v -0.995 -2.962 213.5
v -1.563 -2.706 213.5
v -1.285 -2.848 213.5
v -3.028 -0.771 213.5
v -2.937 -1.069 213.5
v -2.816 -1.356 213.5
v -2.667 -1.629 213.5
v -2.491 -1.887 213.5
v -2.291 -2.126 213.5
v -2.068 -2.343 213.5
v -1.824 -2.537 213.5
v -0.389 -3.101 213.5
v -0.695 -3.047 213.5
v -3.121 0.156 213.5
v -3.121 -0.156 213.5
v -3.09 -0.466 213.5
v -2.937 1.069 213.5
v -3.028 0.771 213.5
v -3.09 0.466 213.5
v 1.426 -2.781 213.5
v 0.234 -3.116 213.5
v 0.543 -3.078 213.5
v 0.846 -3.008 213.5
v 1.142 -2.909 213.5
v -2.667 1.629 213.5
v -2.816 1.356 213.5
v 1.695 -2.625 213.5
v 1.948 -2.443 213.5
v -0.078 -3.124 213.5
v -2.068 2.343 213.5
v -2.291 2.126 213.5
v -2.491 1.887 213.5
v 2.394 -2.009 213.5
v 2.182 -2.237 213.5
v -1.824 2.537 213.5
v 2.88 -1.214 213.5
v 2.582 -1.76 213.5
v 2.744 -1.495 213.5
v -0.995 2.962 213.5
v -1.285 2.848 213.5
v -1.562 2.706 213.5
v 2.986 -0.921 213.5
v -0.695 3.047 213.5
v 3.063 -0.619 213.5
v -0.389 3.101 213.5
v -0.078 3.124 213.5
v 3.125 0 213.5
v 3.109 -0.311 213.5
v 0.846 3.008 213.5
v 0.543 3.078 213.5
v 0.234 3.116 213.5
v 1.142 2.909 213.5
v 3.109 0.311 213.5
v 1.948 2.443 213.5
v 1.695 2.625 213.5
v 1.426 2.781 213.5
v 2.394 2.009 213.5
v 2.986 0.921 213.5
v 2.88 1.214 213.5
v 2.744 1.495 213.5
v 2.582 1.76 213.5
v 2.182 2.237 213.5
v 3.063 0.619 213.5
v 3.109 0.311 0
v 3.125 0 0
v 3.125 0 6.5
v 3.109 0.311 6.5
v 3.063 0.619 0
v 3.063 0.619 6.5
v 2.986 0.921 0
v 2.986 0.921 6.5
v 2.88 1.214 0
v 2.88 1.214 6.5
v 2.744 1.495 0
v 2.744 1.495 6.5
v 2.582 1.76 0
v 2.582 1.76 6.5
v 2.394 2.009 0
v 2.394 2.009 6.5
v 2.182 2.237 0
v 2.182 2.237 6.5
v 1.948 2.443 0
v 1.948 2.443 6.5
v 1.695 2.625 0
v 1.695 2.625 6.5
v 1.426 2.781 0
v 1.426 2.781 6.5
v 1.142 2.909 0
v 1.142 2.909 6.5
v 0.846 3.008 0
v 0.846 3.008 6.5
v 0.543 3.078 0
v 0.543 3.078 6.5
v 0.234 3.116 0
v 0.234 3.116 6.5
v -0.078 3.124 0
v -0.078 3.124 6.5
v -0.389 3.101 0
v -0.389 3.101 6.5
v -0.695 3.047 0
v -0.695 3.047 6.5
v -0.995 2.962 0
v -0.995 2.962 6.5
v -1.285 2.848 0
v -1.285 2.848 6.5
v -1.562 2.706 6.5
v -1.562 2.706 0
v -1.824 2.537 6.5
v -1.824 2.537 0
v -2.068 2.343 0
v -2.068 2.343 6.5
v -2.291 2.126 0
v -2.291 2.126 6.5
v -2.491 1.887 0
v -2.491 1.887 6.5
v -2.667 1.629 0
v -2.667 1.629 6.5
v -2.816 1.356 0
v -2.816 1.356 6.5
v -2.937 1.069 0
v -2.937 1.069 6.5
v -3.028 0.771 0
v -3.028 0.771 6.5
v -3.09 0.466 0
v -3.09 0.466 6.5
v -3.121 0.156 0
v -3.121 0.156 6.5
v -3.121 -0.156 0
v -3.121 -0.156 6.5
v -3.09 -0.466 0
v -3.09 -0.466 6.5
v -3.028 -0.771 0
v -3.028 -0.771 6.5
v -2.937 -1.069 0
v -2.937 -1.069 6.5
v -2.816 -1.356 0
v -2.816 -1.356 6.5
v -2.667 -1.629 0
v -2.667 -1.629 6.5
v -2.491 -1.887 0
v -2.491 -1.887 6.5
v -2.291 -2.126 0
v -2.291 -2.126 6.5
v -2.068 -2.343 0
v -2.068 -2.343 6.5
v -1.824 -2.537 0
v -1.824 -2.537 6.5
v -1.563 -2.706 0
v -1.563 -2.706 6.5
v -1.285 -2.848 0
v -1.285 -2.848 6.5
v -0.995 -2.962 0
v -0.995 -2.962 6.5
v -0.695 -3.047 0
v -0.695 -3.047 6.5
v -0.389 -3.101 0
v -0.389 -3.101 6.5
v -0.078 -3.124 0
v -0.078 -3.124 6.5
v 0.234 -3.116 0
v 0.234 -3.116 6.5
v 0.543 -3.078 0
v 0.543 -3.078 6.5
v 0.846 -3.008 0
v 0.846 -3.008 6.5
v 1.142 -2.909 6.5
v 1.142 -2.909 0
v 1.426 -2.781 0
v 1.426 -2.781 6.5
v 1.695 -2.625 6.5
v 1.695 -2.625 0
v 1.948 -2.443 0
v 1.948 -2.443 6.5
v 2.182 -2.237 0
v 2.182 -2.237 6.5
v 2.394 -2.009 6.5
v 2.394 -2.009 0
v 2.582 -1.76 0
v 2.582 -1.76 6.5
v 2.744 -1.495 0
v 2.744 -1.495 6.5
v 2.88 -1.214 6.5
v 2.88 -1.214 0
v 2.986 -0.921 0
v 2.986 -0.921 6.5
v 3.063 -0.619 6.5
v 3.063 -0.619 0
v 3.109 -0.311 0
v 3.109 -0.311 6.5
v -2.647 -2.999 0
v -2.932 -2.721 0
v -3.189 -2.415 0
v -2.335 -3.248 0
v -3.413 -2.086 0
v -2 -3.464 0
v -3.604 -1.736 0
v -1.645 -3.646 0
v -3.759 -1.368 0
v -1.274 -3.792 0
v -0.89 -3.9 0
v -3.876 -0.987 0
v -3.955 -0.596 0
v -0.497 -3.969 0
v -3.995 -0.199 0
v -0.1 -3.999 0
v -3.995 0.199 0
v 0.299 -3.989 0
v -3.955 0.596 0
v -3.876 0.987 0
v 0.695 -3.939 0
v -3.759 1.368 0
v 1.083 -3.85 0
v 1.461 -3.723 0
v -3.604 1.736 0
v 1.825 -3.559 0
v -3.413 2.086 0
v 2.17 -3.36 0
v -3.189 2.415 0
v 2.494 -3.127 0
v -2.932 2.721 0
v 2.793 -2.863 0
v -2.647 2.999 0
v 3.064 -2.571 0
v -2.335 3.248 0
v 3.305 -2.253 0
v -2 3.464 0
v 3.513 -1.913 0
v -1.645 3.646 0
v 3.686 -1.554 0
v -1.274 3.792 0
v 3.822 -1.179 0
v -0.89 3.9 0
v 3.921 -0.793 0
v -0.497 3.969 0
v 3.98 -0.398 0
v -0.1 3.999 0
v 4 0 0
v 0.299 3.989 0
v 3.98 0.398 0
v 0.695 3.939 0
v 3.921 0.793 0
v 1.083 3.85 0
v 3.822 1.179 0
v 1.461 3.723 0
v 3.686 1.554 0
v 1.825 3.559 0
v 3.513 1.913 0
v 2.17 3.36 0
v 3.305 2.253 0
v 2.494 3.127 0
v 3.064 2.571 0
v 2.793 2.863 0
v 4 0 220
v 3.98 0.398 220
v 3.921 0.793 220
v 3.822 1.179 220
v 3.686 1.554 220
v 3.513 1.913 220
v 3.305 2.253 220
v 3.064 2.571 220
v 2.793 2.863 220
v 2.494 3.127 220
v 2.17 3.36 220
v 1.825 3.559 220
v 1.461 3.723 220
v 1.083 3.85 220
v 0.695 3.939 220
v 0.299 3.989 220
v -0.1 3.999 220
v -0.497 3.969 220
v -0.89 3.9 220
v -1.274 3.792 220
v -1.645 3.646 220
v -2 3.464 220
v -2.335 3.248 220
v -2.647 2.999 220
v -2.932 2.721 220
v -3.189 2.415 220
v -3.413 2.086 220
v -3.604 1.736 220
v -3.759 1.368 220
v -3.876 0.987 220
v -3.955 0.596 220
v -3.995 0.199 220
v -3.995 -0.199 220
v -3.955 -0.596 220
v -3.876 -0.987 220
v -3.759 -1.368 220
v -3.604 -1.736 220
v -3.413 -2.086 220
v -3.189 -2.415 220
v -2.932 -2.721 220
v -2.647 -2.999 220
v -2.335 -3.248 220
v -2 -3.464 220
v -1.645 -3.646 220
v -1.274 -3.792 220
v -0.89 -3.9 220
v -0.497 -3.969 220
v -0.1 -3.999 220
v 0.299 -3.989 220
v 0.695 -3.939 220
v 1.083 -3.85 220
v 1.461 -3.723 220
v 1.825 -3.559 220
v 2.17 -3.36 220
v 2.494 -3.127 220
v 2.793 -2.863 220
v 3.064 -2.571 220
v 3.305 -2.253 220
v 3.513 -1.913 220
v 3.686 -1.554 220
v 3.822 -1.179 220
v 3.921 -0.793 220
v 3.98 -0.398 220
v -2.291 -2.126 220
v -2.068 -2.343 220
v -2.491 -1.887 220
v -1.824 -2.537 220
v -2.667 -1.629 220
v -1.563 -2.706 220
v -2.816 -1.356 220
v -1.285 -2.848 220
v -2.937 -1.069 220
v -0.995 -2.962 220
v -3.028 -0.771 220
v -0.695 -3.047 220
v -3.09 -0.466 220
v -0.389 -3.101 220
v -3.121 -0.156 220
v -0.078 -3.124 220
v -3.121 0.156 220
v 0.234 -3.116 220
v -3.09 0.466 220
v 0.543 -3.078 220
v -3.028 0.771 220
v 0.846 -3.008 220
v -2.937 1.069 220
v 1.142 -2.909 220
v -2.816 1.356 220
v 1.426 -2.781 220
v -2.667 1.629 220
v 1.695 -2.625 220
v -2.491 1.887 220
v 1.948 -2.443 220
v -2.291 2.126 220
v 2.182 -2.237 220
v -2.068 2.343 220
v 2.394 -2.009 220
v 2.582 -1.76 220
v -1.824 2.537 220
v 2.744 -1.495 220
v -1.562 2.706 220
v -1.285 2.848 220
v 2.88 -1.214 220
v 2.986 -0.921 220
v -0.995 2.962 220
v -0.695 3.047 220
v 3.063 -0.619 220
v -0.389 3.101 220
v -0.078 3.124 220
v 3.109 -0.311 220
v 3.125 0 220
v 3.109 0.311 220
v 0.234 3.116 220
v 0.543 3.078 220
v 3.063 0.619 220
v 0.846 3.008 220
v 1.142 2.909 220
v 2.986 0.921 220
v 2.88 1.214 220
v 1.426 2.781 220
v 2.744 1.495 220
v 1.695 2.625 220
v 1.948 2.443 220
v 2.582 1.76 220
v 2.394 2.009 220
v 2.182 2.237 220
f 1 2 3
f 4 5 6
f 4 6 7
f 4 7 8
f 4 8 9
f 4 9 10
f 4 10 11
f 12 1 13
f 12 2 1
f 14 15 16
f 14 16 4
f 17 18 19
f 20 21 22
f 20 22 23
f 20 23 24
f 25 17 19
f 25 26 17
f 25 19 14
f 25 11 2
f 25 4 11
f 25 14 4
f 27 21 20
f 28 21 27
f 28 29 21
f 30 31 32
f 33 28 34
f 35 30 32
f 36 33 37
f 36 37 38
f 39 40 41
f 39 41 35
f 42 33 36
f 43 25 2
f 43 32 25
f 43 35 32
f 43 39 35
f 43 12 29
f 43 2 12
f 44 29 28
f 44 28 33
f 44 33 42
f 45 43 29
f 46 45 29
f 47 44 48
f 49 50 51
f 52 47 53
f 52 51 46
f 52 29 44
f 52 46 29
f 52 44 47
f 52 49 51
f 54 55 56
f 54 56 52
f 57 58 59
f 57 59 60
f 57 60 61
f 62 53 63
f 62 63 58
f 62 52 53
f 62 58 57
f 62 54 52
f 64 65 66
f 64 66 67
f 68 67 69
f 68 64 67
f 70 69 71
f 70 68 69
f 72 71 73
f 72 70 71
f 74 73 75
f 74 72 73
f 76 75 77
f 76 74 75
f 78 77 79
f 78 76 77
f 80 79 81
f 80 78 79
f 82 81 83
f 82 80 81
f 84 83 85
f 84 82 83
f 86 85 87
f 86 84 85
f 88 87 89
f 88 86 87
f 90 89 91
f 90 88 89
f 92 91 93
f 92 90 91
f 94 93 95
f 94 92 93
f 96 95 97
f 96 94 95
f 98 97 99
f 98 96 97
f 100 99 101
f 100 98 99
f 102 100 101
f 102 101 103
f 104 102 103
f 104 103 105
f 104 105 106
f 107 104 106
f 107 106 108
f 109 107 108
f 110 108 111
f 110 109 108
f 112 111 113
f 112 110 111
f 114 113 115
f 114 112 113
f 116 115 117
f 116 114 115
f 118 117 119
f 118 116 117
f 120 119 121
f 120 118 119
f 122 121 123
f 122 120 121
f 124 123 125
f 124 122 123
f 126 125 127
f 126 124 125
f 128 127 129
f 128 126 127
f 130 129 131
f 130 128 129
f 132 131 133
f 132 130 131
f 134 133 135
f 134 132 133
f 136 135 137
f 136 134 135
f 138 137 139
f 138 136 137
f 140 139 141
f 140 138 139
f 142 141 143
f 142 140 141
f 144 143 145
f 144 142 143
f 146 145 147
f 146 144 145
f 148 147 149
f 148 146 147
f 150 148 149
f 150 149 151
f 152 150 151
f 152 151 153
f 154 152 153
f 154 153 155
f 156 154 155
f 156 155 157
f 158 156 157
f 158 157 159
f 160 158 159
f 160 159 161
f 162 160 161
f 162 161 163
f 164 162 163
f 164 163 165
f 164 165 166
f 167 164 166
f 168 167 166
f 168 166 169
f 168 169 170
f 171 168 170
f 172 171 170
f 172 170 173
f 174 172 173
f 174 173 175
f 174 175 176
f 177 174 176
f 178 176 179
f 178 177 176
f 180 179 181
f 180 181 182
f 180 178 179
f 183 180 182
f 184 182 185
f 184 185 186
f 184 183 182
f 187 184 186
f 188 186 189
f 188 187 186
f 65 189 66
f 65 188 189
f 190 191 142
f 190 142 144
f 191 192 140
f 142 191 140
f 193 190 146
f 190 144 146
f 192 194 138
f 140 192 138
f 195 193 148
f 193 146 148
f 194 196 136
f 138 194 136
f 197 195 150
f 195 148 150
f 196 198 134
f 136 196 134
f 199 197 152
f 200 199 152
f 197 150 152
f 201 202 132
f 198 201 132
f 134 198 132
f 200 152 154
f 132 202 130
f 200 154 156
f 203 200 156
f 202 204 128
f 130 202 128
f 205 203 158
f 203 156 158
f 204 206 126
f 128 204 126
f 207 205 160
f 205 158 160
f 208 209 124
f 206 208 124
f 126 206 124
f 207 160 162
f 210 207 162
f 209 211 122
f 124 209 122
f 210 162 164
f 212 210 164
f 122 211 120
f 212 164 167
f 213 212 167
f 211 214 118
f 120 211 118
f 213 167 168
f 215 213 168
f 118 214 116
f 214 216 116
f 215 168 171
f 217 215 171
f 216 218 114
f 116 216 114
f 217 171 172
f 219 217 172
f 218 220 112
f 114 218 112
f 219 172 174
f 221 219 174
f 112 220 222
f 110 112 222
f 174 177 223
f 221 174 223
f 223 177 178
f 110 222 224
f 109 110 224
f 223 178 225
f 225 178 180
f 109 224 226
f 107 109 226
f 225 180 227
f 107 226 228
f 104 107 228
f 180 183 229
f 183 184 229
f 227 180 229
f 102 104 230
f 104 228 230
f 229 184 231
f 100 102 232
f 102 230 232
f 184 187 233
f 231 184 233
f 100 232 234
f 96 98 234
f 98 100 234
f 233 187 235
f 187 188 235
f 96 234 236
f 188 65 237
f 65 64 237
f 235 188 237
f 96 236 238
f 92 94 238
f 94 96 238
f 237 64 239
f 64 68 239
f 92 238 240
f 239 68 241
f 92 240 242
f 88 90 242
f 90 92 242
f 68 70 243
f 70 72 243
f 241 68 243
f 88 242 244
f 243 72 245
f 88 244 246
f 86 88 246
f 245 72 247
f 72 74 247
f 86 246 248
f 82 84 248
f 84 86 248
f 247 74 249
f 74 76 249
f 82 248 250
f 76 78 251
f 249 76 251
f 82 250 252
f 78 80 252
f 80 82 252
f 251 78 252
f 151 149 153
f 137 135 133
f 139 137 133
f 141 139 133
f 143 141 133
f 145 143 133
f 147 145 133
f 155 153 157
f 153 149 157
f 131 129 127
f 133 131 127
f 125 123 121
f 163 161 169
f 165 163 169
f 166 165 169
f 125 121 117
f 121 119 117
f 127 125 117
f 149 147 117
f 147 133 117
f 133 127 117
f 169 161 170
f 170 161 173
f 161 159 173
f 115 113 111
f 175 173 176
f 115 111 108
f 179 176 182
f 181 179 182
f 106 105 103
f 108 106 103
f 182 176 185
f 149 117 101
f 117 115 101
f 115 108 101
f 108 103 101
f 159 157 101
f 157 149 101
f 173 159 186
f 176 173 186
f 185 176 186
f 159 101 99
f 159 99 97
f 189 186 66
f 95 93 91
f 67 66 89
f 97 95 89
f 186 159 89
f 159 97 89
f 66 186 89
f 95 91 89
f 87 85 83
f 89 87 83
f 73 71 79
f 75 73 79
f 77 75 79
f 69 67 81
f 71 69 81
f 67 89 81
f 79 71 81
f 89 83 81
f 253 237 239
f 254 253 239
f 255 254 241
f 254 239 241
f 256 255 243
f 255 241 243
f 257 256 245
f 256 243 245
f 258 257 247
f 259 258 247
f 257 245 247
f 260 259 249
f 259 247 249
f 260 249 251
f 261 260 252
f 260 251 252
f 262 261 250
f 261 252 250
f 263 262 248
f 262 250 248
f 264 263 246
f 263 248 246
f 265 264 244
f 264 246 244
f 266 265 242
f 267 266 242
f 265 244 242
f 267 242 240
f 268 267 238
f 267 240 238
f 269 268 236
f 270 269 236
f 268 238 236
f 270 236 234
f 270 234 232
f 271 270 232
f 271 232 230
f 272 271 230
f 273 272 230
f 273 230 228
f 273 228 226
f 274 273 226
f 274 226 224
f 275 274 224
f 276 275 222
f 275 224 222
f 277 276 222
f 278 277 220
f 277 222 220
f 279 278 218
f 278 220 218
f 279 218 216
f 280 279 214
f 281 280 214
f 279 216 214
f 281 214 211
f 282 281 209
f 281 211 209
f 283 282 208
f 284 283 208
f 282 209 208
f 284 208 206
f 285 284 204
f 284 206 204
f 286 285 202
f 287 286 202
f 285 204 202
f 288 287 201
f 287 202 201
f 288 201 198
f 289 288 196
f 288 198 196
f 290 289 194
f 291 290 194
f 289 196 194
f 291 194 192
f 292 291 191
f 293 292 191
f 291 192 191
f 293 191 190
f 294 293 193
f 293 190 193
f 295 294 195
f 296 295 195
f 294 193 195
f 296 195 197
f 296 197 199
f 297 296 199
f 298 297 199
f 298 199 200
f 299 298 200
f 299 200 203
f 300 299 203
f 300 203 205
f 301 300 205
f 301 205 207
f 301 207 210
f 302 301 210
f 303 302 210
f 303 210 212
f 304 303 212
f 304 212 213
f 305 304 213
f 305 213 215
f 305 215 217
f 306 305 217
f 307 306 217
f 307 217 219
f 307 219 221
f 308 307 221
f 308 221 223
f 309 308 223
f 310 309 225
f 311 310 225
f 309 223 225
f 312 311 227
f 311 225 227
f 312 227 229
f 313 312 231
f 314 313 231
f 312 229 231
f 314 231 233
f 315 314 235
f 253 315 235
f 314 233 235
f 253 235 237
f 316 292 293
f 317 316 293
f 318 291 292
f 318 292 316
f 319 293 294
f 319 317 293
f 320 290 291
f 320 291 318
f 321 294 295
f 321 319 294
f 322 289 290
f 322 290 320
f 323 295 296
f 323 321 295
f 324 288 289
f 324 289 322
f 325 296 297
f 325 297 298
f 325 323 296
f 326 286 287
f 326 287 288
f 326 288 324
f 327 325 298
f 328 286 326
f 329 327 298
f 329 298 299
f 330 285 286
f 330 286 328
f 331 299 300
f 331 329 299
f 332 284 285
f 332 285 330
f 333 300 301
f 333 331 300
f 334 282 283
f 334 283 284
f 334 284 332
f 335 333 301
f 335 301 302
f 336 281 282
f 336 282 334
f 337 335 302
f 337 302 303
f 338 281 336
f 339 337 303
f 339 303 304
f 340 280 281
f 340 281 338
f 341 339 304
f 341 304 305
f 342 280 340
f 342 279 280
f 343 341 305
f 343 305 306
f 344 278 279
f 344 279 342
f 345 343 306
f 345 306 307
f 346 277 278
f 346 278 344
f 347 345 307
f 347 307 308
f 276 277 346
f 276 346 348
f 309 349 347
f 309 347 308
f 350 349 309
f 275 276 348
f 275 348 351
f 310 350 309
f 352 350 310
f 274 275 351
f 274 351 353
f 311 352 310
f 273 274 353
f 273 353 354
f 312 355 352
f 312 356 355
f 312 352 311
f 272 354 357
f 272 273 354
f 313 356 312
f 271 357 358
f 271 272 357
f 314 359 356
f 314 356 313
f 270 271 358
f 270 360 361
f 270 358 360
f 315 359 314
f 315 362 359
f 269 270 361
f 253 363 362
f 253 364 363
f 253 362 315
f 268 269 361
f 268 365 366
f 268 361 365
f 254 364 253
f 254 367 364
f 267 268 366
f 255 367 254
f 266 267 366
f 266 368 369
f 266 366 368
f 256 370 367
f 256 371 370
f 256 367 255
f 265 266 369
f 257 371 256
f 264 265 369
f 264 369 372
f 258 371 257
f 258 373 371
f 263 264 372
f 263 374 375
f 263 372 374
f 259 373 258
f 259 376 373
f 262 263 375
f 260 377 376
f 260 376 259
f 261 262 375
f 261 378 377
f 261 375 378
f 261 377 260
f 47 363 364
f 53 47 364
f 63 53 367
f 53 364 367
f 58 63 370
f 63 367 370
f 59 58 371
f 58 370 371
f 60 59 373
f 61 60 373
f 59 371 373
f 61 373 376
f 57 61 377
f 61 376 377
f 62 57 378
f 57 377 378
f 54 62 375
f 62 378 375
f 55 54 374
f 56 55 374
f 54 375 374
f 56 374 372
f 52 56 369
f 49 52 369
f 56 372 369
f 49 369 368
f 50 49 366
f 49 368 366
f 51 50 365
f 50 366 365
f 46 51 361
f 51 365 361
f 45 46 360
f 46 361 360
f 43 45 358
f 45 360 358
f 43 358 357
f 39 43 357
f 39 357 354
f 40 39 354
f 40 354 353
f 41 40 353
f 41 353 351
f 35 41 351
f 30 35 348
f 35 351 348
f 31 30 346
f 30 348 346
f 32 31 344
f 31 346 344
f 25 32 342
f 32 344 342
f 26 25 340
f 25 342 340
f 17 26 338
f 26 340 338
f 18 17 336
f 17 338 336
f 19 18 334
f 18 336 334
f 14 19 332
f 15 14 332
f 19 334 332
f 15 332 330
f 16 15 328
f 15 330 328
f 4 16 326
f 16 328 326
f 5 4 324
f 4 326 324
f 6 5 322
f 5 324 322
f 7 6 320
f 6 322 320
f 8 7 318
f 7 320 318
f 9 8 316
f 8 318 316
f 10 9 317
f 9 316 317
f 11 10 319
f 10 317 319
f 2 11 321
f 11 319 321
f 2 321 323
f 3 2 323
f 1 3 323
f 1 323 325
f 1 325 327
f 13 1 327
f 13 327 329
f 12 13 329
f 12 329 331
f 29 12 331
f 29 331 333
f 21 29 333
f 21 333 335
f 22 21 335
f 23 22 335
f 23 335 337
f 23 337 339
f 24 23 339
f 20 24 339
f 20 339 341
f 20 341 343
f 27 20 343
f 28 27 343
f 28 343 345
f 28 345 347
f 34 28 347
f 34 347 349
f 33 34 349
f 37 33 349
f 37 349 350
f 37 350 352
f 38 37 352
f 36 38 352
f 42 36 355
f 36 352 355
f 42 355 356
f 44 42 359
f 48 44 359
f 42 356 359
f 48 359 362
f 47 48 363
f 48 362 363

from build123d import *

# Parameters (mm, degrees)
SKETCH1_R           = 4
BOSS_EXTRUDE1_DEPTH = 220
SKETCH2_R           = 3.125
CUT_EXTRUDE1_DEPTH  = 6.5


with BuildPart() as part:
    # Sketch1 → Boss-Extrude1 (new body)
    with BuildSketch(Plane.XY):
        Circle(SKETCH1_R)
    extrude(amount=BOSS_EXTRUDE1_DEPTH)

    # Sketch2 → Cut-Extrude1 (cut)
    with BuildSketch(Plane.XY.offset(220)):
        Circle(SKETCH2_R)
    cut_extrude1 = extrude(amount=-CUT_EXTRUDE1_DEPTH, mode=Mode.SUBTRACT)

    # Mirror1: Cut-Extrude1 across plane
    add(cut_extrude1.mirror(Plane.XY.offset(110)), mode=Mode.SUBTRACT)


solid = part.part
